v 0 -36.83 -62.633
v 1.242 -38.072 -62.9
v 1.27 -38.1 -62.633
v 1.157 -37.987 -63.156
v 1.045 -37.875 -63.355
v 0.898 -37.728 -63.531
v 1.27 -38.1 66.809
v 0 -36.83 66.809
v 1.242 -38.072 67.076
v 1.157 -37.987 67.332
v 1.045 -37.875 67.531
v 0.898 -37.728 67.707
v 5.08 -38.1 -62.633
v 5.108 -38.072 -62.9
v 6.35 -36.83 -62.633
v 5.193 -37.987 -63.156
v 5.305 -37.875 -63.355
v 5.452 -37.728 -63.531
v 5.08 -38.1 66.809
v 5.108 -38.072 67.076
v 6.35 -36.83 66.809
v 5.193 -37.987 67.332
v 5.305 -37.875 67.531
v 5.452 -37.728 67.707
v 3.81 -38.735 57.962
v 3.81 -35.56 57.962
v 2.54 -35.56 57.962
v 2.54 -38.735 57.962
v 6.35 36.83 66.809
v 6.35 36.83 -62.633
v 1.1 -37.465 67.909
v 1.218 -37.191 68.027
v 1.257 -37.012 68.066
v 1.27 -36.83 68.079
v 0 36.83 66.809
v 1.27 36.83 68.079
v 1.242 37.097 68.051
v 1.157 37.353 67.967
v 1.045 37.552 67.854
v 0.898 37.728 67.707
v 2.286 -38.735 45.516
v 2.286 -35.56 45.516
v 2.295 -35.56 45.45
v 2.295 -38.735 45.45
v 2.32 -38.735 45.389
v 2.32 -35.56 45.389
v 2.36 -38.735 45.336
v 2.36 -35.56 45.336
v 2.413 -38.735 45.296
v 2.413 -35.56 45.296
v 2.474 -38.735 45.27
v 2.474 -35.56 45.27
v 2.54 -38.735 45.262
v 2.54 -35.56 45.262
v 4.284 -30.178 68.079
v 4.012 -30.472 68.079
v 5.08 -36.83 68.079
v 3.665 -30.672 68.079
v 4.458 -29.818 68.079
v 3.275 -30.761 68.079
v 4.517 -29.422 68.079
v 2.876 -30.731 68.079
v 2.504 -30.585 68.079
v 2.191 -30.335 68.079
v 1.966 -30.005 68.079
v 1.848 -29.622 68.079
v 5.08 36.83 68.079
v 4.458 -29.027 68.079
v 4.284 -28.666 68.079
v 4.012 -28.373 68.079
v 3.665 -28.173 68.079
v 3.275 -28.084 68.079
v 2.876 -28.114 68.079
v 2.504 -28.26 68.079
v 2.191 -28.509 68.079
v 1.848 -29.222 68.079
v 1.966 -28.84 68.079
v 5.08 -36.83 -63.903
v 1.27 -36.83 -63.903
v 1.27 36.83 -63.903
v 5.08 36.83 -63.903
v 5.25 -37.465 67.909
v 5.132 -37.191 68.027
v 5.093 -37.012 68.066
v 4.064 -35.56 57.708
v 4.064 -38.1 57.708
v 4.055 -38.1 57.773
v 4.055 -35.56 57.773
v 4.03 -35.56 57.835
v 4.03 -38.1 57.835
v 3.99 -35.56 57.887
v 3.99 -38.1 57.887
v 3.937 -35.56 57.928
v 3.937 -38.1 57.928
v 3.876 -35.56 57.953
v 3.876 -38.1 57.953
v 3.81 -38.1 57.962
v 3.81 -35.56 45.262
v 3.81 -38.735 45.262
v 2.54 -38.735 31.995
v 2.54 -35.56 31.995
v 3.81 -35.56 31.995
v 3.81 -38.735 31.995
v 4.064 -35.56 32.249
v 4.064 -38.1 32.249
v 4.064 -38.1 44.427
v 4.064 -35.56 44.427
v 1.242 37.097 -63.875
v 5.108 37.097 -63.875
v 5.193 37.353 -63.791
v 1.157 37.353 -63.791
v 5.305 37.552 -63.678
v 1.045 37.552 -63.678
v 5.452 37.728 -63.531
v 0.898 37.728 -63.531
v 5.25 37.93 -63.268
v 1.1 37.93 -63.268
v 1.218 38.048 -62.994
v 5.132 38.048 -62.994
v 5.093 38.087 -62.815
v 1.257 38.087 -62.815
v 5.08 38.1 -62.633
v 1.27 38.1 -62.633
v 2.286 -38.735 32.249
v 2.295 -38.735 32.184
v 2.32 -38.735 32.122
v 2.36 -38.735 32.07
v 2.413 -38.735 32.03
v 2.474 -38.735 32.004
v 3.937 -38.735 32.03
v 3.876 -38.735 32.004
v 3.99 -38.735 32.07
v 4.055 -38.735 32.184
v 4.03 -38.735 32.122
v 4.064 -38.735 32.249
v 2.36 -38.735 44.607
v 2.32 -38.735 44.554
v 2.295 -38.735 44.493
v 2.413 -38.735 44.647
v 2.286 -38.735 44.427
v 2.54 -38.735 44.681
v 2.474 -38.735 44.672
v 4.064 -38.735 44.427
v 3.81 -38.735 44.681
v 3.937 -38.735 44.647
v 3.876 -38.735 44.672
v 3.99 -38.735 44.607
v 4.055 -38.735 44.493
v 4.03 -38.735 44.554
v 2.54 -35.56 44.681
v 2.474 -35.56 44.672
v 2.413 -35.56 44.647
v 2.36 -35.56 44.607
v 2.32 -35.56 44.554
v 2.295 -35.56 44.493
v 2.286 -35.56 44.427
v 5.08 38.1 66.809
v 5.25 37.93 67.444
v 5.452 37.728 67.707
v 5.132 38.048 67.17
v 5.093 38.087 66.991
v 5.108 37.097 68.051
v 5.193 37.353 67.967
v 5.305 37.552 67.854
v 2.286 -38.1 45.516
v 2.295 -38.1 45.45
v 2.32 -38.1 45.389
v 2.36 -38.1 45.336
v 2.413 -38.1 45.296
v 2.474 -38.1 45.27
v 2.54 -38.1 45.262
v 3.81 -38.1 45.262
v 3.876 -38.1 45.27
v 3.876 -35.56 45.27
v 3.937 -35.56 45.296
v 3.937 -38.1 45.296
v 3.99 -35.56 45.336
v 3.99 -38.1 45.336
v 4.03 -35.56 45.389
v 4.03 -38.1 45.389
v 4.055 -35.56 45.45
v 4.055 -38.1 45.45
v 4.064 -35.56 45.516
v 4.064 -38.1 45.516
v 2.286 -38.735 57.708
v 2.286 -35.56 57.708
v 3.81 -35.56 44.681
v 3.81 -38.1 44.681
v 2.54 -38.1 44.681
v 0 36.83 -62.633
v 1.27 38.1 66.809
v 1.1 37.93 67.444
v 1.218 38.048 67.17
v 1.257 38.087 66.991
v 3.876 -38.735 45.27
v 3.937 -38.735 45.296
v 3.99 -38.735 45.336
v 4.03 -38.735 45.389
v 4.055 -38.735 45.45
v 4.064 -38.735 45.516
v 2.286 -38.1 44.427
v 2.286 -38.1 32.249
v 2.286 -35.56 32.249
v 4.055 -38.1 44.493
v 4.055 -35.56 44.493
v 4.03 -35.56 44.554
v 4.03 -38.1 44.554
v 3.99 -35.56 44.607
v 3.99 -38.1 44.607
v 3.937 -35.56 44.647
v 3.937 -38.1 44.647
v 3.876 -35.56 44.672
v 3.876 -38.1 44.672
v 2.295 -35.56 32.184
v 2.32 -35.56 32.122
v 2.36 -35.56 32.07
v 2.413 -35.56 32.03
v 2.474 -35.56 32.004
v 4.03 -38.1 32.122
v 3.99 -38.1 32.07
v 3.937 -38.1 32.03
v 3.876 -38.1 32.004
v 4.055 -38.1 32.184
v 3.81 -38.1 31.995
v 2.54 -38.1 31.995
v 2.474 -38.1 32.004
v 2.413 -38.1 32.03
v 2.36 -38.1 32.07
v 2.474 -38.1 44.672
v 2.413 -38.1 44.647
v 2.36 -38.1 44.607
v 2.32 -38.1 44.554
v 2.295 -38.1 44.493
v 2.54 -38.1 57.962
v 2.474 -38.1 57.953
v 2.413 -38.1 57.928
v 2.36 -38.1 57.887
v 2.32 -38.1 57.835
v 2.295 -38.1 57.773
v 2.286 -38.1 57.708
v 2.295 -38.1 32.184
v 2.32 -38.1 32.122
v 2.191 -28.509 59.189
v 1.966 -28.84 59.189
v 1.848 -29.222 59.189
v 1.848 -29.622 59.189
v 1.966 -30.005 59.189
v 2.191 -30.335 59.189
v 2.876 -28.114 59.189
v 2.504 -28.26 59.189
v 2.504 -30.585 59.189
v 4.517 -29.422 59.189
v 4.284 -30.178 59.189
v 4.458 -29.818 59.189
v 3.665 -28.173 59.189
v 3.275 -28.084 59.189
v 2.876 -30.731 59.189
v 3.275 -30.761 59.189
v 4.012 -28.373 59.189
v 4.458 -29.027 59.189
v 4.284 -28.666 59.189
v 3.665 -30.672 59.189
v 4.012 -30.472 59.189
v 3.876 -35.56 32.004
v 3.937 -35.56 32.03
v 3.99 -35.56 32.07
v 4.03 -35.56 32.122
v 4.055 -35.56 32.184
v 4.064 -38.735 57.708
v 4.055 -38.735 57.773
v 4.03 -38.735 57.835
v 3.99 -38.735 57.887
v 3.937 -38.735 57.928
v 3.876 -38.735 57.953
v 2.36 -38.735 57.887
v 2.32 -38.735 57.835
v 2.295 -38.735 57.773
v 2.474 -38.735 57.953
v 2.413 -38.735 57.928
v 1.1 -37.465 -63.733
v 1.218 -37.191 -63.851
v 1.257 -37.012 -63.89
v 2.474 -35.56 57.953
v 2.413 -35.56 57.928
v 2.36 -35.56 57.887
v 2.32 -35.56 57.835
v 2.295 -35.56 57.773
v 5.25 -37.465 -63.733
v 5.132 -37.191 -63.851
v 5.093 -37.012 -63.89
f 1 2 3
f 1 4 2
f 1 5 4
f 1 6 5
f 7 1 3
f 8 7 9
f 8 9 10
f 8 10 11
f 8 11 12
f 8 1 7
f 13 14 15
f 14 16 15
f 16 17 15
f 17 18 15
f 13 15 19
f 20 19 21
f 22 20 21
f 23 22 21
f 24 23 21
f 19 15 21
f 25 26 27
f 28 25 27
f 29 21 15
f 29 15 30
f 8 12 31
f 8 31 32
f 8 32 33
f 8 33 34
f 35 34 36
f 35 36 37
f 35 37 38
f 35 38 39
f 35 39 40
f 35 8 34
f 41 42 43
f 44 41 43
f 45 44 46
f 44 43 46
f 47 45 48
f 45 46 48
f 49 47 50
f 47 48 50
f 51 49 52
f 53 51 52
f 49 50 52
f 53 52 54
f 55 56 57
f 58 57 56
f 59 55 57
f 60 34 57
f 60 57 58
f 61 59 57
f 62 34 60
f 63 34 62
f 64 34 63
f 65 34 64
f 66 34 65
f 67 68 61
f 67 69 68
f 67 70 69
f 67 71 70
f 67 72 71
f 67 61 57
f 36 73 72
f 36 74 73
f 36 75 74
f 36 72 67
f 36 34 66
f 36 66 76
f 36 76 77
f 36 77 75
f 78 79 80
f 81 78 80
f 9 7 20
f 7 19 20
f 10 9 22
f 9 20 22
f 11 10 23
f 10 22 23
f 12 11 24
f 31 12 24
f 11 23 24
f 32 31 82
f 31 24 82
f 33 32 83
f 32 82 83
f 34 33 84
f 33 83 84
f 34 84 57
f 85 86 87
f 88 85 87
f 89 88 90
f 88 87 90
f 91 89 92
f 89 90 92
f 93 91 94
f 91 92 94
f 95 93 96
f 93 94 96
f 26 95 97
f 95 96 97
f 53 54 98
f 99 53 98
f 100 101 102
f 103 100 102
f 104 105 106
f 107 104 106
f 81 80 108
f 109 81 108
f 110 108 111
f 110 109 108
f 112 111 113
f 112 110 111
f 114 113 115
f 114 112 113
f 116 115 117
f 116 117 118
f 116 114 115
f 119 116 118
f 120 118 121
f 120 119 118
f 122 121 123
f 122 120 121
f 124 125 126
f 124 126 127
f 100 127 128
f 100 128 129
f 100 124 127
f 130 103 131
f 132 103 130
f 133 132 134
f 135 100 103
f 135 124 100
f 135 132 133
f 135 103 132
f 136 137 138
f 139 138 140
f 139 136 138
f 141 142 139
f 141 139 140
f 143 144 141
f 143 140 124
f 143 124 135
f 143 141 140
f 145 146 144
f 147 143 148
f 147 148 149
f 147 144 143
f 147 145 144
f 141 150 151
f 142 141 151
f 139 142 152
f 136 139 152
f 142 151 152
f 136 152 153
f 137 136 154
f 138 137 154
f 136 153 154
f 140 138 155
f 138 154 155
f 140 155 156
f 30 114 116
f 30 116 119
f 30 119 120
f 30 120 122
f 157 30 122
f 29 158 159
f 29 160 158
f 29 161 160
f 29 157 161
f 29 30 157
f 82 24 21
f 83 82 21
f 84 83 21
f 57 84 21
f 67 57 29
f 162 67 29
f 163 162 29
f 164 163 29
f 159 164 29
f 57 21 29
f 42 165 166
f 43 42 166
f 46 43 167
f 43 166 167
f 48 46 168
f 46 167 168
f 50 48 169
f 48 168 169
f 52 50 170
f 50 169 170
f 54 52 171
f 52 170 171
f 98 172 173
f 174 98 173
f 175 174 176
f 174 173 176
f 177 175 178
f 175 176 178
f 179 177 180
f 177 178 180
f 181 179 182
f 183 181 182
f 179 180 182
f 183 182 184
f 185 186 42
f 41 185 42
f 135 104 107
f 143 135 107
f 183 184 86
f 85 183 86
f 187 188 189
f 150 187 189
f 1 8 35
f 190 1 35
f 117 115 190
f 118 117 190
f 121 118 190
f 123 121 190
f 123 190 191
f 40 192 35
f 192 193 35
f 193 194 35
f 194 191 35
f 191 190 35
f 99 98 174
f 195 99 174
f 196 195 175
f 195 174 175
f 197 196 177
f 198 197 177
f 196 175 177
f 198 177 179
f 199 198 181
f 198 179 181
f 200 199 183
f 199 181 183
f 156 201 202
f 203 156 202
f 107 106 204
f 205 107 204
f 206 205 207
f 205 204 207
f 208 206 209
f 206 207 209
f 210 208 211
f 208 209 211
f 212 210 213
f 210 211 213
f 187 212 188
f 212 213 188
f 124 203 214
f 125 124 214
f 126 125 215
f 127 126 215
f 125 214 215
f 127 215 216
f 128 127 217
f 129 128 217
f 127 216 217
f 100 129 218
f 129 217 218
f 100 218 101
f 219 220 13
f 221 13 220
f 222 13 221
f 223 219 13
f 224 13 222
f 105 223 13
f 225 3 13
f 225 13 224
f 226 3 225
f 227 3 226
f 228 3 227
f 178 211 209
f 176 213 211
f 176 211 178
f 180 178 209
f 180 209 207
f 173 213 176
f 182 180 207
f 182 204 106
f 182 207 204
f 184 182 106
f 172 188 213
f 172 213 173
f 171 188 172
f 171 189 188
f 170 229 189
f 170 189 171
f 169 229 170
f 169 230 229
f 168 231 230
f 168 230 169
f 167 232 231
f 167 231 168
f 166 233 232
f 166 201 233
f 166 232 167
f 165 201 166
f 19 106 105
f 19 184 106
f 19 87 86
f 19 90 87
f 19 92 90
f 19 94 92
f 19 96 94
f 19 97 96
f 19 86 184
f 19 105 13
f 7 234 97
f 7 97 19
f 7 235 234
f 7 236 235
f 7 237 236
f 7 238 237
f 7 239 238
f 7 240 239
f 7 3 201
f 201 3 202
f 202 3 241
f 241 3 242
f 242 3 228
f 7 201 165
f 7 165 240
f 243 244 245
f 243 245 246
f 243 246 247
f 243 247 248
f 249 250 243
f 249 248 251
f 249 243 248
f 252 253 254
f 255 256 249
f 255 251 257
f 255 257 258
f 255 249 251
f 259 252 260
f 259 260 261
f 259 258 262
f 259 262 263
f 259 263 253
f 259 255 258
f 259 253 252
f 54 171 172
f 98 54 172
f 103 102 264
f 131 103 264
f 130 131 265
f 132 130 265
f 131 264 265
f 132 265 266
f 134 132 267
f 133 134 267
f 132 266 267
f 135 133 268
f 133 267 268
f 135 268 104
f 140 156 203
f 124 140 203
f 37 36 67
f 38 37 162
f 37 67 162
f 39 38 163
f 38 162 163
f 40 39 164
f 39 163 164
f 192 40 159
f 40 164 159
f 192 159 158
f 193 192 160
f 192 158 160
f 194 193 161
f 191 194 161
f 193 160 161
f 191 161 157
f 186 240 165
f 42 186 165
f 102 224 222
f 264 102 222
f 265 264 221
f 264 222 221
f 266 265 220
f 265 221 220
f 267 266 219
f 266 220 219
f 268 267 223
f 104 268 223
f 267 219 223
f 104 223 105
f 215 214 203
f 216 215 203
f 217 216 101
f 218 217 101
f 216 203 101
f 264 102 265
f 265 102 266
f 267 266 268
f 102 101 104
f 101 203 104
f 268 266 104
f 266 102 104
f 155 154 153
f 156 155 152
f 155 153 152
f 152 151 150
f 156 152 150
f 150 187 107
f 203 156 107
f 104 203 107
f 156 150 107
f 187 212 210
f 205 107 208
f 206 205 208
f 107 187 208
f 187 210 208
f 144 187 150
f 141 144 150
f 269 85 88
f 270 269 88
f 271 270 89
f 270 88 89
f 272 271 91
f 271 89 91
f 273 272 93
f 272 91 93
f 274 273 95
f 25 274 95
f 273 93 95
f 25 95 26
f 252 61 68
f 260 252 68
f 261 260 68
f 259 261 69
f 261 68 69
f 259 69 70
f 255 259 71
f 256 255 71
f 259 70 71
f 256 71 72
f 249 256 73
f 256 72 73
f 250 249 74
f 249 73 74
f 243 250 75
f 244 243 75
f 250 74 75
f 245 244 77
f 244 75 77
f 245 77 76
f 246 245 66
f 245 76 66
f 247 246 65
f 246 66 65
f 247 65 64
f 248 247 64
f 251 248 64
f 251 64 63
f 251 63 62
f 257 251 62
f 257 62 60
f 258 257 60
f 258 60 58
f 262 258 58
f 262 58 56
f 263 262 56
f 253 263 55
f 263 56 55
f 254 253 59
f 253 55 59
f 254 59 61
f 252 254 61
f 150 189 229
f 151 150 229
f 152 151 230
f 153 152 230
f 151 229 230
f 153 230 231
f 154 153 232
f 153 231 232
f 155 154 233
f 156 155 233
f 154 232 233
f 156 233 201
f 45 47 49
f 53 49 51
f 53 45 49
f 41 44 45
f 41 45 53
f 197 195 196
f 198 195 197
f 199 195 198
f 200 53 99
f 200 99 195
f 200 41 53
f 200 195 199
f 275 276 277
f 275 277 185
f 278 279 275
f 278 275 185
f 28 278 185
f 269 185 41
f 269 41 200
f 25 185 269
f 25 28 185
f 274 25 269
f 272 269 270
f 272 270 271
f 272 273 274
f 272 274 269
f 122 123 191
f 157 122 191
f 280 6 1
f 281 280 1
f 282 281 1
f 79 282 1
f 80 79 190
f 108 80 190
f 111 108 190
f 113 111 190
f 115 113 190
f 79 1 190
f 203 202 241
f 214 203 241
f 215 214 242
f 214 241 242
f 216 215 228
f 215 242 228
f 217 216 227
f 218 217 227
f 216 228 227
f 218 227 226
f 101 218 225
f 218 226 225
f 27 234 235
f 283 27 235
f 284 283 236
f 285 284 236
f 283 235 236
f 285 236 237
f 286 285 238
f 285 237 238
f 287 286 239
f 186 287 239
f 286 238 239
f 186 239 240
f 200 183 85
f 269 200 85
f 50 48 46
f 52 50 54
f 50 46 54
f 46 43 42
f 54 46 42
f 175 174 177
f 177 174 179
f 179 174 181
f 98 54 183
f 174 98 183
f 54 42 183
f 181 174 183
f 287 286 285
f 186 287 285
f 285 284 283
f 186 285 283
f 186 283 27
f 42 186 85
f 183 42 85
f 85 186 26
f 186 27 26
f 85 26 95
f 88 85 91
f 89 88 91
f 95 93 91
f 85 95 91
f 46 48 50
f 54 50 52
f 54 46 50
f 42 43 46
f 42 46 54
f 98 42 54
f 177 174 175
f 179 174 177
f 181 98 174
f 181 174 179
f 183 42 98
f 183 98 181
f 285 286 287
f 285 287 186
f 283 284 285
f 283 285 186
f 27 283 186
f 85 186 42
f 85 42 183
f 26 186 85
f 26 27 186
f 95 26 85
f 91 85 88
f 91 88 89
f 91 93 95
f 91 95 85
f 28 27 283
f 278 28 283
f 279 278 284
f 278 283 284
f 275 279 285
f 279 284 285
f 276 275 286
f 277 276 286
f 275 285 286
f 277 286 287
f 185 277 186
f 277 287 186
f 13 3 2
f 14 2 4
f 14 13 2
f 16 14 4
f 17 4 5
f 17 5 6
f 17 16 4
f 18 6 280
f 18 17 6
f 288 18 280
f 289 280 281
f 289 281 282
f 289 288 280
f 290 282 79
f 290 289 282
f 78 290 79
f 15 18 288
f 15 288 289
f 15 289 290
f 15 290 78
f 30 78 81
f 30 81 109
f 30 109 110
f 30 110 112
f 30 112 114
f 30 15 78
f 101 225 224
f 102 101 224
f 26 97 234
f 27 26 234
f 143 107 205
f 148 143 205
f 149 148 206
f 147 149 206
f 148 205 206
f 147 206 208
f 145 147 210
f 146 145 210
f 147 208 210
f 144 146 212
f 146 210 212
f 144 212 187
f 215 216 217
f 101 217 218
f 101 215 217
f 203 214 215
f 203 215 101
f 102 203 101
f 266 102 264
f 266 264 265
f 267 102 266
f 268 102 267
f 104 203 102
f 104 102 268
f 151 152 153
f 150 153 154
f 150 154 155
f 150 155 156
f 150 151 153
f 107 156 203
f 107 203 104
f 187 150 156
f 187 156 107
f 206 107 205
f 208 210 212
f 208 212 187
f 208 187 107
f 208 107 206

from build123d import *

# Parameters (mm, degrees)
F0_W      = 76.2
F0_H      = 131.982272
F1_DEPTH  = 6.35
F3_SIZE   = 1.27
F4_R      = 1.27
F6_DEPTH  = 2.54
F7_R      = 1.342424
F8_DEPTH  = 8.89
F9_DEPTH  = 3.175
F11_DEPTH = 3.175


with BuildPart() as f1:
    # F0 (on Right) → F1 (new body)
    with BuildSketch(Plane.YZ):
        with Locations((0, 2.088005)):
            Rectangle(F0_W, F0_H)
    extrude(amount=F1_DEPTH)

    # F3
    f3_edges = [f1.edges().sort_by_distance(p)[0] for p in [
        (6.35, 38.1, 2.088005),
        (0, 38.1, 2.088005),
        (6.35, 0, -63.903131),
        (0, 0, -63.903131),
        (6.35, -38.1, 2.088005),
        (0, -38.1, 2.088005),
        (6.35, 0, 68.079141),
        (0, 0, 68.079141),
    ]]
    chamfer(f3_edges, length=F3_SIZE)

    # F4
    f4_edges = [f1.edges().sort_by_distance(p)[0] for p in [
        (3.175, -38.1, 68.079141),
        (3.175, -38.1, -63.903131),
        (3.175, 38.1, 68.079141),
        (3.175, 38.1, -63.903131),
    ]]
    fillet(f4_edges, radius=F4_R)

    # F5 (on face) → F6 (cut)
    with BuildSketch(Plane.XZ.offset(38.1)):
        with BuildLine():
            Line((3.81, 57.961643), (2.54, 57.961643))
            ThreePointArc((2.54, 57.961643), (2.360395, 57.887248), (2.286, 57.707643))
            Line((2.286, 57.707643), (2.286, 45.515643))
            ThreePointArc((2.286, 45.515643), (2.360395, 45.336038), (2.54, 45.261643))
            Line((2.54, 45.261643), (3.81, 45.261643))
            ThreePointArc((3.81, 45.261643), (3.989605, 45.336038), (4.064, 45.515643))
            Line((4.064, 45.515643), (4.064, 57.707643))
            ThreePointArc((4.064, 57.707643), (3.989605, 57.887248), (3.81, 57.961643))
        make_face()
        with BuildLine():
            Line((3.81, 44.681029), (2.54, 44.681029))
            ThreePointArc((2.54, 44.681029), (2.360395, 44.606634), (2.286, 44.427029))
            Line((2.286, 44.427029), (2.286, 32.249487))
            ThreePointArc((2.286, 32.249487), (2.360395, 32.069882), (2.54, 31.995487))
            Line((2.54, 31.995487), (3.81, 31.995487))
            ThreePointArc((3.81, 31.995487), (3.989605, 32.069882), (4.064, 32.249487))
            Line((4.064, 32.249487), (4.064, 44.427029))
            ThreePointArc((4.064, 44.427029), (3.989605, 44.606634), (3.81, 44.681029))
        make_face()
    extrude(amount=-F6_DEPTH, mode=Mode.SUBTRACT)

    # F7 (on face) → F8 (cut)
    with BuildSketch(Plane.XY.offset(68.079141)):
        with Locations((3.175, -29.422283)):
            Circle(F7_R)
    extrude(amount=-F8_DEPTH, mode=Mode.SUBTRACT)


with BuildPart() as f9:
    # F6_face (on face) → F9 (new body)
    with BuildSketch(Plane(origin=(3.175, -35.56, 38.338258), x_dir=(1, 0, 0), z_dir=(0, -1, 0))):
        with BuildLine():
            Line((0.889, -6.088771), (0.889, 6.088771))
            ThreePointArc((0.889, 6.088771), (0.814605, 6.268376), (0.635, 6.342771))
            Line((0.635, 6.342771), (-0.635, 6.342771))
            ThreePointArc((-0.635, 6.342771), (-0.814605, 6.268376), (-0.889, 6.088771))
            Line((-0.889, 6.088771), (-0.889, -6.088771))
            ThreePointArc((-0.889, -6.088771), (-0.814605, -6.268376), (-0.635, -6.342771))
            Line((-0.635, -6.342771), (0.635, -6.342771))
            ThreePointArc((0.635, -6.342771), (0.814605, -6.268376), (0.889, -6.088771))
        make_face()
    extrude(amount=F9_DEPTH)


with BuildPart() as f11:
    # F10 (on face) → F11 (new body)
    with BuildSketch(Plane.XZ.offset(35.56)):
        with BuildLine():
            Line((4.064, 45.515643), (4.064, 57.707643))
            ThreePointArc((4.064, 57.707643), (3.989605, 57.887248), (3.81, 57.961643))
            Line((3.81, 57.961643), (2.54, 57.961643))
            ThreePointArc((2.54, 57.961643), (2.360395, 57.887248), (2.286, 57.707643))
            Line((2.286, 57.707643), (2.286, 45.515643))
            ThreePointArc((2.286, 45.515643), (2.360395, 45.336038), (2.54, 45.261643))
            Line((2.54, 45.261643), (3.81, 45.261643))
            ThreePointArc((3.81, 45.261643), (3.989605, 45.336038), (4.064, 45.515643))
        make_face()
    extrude(amount=F11_DEPTH)


solid = Compound([f1.part, f9.part, f11.part])
